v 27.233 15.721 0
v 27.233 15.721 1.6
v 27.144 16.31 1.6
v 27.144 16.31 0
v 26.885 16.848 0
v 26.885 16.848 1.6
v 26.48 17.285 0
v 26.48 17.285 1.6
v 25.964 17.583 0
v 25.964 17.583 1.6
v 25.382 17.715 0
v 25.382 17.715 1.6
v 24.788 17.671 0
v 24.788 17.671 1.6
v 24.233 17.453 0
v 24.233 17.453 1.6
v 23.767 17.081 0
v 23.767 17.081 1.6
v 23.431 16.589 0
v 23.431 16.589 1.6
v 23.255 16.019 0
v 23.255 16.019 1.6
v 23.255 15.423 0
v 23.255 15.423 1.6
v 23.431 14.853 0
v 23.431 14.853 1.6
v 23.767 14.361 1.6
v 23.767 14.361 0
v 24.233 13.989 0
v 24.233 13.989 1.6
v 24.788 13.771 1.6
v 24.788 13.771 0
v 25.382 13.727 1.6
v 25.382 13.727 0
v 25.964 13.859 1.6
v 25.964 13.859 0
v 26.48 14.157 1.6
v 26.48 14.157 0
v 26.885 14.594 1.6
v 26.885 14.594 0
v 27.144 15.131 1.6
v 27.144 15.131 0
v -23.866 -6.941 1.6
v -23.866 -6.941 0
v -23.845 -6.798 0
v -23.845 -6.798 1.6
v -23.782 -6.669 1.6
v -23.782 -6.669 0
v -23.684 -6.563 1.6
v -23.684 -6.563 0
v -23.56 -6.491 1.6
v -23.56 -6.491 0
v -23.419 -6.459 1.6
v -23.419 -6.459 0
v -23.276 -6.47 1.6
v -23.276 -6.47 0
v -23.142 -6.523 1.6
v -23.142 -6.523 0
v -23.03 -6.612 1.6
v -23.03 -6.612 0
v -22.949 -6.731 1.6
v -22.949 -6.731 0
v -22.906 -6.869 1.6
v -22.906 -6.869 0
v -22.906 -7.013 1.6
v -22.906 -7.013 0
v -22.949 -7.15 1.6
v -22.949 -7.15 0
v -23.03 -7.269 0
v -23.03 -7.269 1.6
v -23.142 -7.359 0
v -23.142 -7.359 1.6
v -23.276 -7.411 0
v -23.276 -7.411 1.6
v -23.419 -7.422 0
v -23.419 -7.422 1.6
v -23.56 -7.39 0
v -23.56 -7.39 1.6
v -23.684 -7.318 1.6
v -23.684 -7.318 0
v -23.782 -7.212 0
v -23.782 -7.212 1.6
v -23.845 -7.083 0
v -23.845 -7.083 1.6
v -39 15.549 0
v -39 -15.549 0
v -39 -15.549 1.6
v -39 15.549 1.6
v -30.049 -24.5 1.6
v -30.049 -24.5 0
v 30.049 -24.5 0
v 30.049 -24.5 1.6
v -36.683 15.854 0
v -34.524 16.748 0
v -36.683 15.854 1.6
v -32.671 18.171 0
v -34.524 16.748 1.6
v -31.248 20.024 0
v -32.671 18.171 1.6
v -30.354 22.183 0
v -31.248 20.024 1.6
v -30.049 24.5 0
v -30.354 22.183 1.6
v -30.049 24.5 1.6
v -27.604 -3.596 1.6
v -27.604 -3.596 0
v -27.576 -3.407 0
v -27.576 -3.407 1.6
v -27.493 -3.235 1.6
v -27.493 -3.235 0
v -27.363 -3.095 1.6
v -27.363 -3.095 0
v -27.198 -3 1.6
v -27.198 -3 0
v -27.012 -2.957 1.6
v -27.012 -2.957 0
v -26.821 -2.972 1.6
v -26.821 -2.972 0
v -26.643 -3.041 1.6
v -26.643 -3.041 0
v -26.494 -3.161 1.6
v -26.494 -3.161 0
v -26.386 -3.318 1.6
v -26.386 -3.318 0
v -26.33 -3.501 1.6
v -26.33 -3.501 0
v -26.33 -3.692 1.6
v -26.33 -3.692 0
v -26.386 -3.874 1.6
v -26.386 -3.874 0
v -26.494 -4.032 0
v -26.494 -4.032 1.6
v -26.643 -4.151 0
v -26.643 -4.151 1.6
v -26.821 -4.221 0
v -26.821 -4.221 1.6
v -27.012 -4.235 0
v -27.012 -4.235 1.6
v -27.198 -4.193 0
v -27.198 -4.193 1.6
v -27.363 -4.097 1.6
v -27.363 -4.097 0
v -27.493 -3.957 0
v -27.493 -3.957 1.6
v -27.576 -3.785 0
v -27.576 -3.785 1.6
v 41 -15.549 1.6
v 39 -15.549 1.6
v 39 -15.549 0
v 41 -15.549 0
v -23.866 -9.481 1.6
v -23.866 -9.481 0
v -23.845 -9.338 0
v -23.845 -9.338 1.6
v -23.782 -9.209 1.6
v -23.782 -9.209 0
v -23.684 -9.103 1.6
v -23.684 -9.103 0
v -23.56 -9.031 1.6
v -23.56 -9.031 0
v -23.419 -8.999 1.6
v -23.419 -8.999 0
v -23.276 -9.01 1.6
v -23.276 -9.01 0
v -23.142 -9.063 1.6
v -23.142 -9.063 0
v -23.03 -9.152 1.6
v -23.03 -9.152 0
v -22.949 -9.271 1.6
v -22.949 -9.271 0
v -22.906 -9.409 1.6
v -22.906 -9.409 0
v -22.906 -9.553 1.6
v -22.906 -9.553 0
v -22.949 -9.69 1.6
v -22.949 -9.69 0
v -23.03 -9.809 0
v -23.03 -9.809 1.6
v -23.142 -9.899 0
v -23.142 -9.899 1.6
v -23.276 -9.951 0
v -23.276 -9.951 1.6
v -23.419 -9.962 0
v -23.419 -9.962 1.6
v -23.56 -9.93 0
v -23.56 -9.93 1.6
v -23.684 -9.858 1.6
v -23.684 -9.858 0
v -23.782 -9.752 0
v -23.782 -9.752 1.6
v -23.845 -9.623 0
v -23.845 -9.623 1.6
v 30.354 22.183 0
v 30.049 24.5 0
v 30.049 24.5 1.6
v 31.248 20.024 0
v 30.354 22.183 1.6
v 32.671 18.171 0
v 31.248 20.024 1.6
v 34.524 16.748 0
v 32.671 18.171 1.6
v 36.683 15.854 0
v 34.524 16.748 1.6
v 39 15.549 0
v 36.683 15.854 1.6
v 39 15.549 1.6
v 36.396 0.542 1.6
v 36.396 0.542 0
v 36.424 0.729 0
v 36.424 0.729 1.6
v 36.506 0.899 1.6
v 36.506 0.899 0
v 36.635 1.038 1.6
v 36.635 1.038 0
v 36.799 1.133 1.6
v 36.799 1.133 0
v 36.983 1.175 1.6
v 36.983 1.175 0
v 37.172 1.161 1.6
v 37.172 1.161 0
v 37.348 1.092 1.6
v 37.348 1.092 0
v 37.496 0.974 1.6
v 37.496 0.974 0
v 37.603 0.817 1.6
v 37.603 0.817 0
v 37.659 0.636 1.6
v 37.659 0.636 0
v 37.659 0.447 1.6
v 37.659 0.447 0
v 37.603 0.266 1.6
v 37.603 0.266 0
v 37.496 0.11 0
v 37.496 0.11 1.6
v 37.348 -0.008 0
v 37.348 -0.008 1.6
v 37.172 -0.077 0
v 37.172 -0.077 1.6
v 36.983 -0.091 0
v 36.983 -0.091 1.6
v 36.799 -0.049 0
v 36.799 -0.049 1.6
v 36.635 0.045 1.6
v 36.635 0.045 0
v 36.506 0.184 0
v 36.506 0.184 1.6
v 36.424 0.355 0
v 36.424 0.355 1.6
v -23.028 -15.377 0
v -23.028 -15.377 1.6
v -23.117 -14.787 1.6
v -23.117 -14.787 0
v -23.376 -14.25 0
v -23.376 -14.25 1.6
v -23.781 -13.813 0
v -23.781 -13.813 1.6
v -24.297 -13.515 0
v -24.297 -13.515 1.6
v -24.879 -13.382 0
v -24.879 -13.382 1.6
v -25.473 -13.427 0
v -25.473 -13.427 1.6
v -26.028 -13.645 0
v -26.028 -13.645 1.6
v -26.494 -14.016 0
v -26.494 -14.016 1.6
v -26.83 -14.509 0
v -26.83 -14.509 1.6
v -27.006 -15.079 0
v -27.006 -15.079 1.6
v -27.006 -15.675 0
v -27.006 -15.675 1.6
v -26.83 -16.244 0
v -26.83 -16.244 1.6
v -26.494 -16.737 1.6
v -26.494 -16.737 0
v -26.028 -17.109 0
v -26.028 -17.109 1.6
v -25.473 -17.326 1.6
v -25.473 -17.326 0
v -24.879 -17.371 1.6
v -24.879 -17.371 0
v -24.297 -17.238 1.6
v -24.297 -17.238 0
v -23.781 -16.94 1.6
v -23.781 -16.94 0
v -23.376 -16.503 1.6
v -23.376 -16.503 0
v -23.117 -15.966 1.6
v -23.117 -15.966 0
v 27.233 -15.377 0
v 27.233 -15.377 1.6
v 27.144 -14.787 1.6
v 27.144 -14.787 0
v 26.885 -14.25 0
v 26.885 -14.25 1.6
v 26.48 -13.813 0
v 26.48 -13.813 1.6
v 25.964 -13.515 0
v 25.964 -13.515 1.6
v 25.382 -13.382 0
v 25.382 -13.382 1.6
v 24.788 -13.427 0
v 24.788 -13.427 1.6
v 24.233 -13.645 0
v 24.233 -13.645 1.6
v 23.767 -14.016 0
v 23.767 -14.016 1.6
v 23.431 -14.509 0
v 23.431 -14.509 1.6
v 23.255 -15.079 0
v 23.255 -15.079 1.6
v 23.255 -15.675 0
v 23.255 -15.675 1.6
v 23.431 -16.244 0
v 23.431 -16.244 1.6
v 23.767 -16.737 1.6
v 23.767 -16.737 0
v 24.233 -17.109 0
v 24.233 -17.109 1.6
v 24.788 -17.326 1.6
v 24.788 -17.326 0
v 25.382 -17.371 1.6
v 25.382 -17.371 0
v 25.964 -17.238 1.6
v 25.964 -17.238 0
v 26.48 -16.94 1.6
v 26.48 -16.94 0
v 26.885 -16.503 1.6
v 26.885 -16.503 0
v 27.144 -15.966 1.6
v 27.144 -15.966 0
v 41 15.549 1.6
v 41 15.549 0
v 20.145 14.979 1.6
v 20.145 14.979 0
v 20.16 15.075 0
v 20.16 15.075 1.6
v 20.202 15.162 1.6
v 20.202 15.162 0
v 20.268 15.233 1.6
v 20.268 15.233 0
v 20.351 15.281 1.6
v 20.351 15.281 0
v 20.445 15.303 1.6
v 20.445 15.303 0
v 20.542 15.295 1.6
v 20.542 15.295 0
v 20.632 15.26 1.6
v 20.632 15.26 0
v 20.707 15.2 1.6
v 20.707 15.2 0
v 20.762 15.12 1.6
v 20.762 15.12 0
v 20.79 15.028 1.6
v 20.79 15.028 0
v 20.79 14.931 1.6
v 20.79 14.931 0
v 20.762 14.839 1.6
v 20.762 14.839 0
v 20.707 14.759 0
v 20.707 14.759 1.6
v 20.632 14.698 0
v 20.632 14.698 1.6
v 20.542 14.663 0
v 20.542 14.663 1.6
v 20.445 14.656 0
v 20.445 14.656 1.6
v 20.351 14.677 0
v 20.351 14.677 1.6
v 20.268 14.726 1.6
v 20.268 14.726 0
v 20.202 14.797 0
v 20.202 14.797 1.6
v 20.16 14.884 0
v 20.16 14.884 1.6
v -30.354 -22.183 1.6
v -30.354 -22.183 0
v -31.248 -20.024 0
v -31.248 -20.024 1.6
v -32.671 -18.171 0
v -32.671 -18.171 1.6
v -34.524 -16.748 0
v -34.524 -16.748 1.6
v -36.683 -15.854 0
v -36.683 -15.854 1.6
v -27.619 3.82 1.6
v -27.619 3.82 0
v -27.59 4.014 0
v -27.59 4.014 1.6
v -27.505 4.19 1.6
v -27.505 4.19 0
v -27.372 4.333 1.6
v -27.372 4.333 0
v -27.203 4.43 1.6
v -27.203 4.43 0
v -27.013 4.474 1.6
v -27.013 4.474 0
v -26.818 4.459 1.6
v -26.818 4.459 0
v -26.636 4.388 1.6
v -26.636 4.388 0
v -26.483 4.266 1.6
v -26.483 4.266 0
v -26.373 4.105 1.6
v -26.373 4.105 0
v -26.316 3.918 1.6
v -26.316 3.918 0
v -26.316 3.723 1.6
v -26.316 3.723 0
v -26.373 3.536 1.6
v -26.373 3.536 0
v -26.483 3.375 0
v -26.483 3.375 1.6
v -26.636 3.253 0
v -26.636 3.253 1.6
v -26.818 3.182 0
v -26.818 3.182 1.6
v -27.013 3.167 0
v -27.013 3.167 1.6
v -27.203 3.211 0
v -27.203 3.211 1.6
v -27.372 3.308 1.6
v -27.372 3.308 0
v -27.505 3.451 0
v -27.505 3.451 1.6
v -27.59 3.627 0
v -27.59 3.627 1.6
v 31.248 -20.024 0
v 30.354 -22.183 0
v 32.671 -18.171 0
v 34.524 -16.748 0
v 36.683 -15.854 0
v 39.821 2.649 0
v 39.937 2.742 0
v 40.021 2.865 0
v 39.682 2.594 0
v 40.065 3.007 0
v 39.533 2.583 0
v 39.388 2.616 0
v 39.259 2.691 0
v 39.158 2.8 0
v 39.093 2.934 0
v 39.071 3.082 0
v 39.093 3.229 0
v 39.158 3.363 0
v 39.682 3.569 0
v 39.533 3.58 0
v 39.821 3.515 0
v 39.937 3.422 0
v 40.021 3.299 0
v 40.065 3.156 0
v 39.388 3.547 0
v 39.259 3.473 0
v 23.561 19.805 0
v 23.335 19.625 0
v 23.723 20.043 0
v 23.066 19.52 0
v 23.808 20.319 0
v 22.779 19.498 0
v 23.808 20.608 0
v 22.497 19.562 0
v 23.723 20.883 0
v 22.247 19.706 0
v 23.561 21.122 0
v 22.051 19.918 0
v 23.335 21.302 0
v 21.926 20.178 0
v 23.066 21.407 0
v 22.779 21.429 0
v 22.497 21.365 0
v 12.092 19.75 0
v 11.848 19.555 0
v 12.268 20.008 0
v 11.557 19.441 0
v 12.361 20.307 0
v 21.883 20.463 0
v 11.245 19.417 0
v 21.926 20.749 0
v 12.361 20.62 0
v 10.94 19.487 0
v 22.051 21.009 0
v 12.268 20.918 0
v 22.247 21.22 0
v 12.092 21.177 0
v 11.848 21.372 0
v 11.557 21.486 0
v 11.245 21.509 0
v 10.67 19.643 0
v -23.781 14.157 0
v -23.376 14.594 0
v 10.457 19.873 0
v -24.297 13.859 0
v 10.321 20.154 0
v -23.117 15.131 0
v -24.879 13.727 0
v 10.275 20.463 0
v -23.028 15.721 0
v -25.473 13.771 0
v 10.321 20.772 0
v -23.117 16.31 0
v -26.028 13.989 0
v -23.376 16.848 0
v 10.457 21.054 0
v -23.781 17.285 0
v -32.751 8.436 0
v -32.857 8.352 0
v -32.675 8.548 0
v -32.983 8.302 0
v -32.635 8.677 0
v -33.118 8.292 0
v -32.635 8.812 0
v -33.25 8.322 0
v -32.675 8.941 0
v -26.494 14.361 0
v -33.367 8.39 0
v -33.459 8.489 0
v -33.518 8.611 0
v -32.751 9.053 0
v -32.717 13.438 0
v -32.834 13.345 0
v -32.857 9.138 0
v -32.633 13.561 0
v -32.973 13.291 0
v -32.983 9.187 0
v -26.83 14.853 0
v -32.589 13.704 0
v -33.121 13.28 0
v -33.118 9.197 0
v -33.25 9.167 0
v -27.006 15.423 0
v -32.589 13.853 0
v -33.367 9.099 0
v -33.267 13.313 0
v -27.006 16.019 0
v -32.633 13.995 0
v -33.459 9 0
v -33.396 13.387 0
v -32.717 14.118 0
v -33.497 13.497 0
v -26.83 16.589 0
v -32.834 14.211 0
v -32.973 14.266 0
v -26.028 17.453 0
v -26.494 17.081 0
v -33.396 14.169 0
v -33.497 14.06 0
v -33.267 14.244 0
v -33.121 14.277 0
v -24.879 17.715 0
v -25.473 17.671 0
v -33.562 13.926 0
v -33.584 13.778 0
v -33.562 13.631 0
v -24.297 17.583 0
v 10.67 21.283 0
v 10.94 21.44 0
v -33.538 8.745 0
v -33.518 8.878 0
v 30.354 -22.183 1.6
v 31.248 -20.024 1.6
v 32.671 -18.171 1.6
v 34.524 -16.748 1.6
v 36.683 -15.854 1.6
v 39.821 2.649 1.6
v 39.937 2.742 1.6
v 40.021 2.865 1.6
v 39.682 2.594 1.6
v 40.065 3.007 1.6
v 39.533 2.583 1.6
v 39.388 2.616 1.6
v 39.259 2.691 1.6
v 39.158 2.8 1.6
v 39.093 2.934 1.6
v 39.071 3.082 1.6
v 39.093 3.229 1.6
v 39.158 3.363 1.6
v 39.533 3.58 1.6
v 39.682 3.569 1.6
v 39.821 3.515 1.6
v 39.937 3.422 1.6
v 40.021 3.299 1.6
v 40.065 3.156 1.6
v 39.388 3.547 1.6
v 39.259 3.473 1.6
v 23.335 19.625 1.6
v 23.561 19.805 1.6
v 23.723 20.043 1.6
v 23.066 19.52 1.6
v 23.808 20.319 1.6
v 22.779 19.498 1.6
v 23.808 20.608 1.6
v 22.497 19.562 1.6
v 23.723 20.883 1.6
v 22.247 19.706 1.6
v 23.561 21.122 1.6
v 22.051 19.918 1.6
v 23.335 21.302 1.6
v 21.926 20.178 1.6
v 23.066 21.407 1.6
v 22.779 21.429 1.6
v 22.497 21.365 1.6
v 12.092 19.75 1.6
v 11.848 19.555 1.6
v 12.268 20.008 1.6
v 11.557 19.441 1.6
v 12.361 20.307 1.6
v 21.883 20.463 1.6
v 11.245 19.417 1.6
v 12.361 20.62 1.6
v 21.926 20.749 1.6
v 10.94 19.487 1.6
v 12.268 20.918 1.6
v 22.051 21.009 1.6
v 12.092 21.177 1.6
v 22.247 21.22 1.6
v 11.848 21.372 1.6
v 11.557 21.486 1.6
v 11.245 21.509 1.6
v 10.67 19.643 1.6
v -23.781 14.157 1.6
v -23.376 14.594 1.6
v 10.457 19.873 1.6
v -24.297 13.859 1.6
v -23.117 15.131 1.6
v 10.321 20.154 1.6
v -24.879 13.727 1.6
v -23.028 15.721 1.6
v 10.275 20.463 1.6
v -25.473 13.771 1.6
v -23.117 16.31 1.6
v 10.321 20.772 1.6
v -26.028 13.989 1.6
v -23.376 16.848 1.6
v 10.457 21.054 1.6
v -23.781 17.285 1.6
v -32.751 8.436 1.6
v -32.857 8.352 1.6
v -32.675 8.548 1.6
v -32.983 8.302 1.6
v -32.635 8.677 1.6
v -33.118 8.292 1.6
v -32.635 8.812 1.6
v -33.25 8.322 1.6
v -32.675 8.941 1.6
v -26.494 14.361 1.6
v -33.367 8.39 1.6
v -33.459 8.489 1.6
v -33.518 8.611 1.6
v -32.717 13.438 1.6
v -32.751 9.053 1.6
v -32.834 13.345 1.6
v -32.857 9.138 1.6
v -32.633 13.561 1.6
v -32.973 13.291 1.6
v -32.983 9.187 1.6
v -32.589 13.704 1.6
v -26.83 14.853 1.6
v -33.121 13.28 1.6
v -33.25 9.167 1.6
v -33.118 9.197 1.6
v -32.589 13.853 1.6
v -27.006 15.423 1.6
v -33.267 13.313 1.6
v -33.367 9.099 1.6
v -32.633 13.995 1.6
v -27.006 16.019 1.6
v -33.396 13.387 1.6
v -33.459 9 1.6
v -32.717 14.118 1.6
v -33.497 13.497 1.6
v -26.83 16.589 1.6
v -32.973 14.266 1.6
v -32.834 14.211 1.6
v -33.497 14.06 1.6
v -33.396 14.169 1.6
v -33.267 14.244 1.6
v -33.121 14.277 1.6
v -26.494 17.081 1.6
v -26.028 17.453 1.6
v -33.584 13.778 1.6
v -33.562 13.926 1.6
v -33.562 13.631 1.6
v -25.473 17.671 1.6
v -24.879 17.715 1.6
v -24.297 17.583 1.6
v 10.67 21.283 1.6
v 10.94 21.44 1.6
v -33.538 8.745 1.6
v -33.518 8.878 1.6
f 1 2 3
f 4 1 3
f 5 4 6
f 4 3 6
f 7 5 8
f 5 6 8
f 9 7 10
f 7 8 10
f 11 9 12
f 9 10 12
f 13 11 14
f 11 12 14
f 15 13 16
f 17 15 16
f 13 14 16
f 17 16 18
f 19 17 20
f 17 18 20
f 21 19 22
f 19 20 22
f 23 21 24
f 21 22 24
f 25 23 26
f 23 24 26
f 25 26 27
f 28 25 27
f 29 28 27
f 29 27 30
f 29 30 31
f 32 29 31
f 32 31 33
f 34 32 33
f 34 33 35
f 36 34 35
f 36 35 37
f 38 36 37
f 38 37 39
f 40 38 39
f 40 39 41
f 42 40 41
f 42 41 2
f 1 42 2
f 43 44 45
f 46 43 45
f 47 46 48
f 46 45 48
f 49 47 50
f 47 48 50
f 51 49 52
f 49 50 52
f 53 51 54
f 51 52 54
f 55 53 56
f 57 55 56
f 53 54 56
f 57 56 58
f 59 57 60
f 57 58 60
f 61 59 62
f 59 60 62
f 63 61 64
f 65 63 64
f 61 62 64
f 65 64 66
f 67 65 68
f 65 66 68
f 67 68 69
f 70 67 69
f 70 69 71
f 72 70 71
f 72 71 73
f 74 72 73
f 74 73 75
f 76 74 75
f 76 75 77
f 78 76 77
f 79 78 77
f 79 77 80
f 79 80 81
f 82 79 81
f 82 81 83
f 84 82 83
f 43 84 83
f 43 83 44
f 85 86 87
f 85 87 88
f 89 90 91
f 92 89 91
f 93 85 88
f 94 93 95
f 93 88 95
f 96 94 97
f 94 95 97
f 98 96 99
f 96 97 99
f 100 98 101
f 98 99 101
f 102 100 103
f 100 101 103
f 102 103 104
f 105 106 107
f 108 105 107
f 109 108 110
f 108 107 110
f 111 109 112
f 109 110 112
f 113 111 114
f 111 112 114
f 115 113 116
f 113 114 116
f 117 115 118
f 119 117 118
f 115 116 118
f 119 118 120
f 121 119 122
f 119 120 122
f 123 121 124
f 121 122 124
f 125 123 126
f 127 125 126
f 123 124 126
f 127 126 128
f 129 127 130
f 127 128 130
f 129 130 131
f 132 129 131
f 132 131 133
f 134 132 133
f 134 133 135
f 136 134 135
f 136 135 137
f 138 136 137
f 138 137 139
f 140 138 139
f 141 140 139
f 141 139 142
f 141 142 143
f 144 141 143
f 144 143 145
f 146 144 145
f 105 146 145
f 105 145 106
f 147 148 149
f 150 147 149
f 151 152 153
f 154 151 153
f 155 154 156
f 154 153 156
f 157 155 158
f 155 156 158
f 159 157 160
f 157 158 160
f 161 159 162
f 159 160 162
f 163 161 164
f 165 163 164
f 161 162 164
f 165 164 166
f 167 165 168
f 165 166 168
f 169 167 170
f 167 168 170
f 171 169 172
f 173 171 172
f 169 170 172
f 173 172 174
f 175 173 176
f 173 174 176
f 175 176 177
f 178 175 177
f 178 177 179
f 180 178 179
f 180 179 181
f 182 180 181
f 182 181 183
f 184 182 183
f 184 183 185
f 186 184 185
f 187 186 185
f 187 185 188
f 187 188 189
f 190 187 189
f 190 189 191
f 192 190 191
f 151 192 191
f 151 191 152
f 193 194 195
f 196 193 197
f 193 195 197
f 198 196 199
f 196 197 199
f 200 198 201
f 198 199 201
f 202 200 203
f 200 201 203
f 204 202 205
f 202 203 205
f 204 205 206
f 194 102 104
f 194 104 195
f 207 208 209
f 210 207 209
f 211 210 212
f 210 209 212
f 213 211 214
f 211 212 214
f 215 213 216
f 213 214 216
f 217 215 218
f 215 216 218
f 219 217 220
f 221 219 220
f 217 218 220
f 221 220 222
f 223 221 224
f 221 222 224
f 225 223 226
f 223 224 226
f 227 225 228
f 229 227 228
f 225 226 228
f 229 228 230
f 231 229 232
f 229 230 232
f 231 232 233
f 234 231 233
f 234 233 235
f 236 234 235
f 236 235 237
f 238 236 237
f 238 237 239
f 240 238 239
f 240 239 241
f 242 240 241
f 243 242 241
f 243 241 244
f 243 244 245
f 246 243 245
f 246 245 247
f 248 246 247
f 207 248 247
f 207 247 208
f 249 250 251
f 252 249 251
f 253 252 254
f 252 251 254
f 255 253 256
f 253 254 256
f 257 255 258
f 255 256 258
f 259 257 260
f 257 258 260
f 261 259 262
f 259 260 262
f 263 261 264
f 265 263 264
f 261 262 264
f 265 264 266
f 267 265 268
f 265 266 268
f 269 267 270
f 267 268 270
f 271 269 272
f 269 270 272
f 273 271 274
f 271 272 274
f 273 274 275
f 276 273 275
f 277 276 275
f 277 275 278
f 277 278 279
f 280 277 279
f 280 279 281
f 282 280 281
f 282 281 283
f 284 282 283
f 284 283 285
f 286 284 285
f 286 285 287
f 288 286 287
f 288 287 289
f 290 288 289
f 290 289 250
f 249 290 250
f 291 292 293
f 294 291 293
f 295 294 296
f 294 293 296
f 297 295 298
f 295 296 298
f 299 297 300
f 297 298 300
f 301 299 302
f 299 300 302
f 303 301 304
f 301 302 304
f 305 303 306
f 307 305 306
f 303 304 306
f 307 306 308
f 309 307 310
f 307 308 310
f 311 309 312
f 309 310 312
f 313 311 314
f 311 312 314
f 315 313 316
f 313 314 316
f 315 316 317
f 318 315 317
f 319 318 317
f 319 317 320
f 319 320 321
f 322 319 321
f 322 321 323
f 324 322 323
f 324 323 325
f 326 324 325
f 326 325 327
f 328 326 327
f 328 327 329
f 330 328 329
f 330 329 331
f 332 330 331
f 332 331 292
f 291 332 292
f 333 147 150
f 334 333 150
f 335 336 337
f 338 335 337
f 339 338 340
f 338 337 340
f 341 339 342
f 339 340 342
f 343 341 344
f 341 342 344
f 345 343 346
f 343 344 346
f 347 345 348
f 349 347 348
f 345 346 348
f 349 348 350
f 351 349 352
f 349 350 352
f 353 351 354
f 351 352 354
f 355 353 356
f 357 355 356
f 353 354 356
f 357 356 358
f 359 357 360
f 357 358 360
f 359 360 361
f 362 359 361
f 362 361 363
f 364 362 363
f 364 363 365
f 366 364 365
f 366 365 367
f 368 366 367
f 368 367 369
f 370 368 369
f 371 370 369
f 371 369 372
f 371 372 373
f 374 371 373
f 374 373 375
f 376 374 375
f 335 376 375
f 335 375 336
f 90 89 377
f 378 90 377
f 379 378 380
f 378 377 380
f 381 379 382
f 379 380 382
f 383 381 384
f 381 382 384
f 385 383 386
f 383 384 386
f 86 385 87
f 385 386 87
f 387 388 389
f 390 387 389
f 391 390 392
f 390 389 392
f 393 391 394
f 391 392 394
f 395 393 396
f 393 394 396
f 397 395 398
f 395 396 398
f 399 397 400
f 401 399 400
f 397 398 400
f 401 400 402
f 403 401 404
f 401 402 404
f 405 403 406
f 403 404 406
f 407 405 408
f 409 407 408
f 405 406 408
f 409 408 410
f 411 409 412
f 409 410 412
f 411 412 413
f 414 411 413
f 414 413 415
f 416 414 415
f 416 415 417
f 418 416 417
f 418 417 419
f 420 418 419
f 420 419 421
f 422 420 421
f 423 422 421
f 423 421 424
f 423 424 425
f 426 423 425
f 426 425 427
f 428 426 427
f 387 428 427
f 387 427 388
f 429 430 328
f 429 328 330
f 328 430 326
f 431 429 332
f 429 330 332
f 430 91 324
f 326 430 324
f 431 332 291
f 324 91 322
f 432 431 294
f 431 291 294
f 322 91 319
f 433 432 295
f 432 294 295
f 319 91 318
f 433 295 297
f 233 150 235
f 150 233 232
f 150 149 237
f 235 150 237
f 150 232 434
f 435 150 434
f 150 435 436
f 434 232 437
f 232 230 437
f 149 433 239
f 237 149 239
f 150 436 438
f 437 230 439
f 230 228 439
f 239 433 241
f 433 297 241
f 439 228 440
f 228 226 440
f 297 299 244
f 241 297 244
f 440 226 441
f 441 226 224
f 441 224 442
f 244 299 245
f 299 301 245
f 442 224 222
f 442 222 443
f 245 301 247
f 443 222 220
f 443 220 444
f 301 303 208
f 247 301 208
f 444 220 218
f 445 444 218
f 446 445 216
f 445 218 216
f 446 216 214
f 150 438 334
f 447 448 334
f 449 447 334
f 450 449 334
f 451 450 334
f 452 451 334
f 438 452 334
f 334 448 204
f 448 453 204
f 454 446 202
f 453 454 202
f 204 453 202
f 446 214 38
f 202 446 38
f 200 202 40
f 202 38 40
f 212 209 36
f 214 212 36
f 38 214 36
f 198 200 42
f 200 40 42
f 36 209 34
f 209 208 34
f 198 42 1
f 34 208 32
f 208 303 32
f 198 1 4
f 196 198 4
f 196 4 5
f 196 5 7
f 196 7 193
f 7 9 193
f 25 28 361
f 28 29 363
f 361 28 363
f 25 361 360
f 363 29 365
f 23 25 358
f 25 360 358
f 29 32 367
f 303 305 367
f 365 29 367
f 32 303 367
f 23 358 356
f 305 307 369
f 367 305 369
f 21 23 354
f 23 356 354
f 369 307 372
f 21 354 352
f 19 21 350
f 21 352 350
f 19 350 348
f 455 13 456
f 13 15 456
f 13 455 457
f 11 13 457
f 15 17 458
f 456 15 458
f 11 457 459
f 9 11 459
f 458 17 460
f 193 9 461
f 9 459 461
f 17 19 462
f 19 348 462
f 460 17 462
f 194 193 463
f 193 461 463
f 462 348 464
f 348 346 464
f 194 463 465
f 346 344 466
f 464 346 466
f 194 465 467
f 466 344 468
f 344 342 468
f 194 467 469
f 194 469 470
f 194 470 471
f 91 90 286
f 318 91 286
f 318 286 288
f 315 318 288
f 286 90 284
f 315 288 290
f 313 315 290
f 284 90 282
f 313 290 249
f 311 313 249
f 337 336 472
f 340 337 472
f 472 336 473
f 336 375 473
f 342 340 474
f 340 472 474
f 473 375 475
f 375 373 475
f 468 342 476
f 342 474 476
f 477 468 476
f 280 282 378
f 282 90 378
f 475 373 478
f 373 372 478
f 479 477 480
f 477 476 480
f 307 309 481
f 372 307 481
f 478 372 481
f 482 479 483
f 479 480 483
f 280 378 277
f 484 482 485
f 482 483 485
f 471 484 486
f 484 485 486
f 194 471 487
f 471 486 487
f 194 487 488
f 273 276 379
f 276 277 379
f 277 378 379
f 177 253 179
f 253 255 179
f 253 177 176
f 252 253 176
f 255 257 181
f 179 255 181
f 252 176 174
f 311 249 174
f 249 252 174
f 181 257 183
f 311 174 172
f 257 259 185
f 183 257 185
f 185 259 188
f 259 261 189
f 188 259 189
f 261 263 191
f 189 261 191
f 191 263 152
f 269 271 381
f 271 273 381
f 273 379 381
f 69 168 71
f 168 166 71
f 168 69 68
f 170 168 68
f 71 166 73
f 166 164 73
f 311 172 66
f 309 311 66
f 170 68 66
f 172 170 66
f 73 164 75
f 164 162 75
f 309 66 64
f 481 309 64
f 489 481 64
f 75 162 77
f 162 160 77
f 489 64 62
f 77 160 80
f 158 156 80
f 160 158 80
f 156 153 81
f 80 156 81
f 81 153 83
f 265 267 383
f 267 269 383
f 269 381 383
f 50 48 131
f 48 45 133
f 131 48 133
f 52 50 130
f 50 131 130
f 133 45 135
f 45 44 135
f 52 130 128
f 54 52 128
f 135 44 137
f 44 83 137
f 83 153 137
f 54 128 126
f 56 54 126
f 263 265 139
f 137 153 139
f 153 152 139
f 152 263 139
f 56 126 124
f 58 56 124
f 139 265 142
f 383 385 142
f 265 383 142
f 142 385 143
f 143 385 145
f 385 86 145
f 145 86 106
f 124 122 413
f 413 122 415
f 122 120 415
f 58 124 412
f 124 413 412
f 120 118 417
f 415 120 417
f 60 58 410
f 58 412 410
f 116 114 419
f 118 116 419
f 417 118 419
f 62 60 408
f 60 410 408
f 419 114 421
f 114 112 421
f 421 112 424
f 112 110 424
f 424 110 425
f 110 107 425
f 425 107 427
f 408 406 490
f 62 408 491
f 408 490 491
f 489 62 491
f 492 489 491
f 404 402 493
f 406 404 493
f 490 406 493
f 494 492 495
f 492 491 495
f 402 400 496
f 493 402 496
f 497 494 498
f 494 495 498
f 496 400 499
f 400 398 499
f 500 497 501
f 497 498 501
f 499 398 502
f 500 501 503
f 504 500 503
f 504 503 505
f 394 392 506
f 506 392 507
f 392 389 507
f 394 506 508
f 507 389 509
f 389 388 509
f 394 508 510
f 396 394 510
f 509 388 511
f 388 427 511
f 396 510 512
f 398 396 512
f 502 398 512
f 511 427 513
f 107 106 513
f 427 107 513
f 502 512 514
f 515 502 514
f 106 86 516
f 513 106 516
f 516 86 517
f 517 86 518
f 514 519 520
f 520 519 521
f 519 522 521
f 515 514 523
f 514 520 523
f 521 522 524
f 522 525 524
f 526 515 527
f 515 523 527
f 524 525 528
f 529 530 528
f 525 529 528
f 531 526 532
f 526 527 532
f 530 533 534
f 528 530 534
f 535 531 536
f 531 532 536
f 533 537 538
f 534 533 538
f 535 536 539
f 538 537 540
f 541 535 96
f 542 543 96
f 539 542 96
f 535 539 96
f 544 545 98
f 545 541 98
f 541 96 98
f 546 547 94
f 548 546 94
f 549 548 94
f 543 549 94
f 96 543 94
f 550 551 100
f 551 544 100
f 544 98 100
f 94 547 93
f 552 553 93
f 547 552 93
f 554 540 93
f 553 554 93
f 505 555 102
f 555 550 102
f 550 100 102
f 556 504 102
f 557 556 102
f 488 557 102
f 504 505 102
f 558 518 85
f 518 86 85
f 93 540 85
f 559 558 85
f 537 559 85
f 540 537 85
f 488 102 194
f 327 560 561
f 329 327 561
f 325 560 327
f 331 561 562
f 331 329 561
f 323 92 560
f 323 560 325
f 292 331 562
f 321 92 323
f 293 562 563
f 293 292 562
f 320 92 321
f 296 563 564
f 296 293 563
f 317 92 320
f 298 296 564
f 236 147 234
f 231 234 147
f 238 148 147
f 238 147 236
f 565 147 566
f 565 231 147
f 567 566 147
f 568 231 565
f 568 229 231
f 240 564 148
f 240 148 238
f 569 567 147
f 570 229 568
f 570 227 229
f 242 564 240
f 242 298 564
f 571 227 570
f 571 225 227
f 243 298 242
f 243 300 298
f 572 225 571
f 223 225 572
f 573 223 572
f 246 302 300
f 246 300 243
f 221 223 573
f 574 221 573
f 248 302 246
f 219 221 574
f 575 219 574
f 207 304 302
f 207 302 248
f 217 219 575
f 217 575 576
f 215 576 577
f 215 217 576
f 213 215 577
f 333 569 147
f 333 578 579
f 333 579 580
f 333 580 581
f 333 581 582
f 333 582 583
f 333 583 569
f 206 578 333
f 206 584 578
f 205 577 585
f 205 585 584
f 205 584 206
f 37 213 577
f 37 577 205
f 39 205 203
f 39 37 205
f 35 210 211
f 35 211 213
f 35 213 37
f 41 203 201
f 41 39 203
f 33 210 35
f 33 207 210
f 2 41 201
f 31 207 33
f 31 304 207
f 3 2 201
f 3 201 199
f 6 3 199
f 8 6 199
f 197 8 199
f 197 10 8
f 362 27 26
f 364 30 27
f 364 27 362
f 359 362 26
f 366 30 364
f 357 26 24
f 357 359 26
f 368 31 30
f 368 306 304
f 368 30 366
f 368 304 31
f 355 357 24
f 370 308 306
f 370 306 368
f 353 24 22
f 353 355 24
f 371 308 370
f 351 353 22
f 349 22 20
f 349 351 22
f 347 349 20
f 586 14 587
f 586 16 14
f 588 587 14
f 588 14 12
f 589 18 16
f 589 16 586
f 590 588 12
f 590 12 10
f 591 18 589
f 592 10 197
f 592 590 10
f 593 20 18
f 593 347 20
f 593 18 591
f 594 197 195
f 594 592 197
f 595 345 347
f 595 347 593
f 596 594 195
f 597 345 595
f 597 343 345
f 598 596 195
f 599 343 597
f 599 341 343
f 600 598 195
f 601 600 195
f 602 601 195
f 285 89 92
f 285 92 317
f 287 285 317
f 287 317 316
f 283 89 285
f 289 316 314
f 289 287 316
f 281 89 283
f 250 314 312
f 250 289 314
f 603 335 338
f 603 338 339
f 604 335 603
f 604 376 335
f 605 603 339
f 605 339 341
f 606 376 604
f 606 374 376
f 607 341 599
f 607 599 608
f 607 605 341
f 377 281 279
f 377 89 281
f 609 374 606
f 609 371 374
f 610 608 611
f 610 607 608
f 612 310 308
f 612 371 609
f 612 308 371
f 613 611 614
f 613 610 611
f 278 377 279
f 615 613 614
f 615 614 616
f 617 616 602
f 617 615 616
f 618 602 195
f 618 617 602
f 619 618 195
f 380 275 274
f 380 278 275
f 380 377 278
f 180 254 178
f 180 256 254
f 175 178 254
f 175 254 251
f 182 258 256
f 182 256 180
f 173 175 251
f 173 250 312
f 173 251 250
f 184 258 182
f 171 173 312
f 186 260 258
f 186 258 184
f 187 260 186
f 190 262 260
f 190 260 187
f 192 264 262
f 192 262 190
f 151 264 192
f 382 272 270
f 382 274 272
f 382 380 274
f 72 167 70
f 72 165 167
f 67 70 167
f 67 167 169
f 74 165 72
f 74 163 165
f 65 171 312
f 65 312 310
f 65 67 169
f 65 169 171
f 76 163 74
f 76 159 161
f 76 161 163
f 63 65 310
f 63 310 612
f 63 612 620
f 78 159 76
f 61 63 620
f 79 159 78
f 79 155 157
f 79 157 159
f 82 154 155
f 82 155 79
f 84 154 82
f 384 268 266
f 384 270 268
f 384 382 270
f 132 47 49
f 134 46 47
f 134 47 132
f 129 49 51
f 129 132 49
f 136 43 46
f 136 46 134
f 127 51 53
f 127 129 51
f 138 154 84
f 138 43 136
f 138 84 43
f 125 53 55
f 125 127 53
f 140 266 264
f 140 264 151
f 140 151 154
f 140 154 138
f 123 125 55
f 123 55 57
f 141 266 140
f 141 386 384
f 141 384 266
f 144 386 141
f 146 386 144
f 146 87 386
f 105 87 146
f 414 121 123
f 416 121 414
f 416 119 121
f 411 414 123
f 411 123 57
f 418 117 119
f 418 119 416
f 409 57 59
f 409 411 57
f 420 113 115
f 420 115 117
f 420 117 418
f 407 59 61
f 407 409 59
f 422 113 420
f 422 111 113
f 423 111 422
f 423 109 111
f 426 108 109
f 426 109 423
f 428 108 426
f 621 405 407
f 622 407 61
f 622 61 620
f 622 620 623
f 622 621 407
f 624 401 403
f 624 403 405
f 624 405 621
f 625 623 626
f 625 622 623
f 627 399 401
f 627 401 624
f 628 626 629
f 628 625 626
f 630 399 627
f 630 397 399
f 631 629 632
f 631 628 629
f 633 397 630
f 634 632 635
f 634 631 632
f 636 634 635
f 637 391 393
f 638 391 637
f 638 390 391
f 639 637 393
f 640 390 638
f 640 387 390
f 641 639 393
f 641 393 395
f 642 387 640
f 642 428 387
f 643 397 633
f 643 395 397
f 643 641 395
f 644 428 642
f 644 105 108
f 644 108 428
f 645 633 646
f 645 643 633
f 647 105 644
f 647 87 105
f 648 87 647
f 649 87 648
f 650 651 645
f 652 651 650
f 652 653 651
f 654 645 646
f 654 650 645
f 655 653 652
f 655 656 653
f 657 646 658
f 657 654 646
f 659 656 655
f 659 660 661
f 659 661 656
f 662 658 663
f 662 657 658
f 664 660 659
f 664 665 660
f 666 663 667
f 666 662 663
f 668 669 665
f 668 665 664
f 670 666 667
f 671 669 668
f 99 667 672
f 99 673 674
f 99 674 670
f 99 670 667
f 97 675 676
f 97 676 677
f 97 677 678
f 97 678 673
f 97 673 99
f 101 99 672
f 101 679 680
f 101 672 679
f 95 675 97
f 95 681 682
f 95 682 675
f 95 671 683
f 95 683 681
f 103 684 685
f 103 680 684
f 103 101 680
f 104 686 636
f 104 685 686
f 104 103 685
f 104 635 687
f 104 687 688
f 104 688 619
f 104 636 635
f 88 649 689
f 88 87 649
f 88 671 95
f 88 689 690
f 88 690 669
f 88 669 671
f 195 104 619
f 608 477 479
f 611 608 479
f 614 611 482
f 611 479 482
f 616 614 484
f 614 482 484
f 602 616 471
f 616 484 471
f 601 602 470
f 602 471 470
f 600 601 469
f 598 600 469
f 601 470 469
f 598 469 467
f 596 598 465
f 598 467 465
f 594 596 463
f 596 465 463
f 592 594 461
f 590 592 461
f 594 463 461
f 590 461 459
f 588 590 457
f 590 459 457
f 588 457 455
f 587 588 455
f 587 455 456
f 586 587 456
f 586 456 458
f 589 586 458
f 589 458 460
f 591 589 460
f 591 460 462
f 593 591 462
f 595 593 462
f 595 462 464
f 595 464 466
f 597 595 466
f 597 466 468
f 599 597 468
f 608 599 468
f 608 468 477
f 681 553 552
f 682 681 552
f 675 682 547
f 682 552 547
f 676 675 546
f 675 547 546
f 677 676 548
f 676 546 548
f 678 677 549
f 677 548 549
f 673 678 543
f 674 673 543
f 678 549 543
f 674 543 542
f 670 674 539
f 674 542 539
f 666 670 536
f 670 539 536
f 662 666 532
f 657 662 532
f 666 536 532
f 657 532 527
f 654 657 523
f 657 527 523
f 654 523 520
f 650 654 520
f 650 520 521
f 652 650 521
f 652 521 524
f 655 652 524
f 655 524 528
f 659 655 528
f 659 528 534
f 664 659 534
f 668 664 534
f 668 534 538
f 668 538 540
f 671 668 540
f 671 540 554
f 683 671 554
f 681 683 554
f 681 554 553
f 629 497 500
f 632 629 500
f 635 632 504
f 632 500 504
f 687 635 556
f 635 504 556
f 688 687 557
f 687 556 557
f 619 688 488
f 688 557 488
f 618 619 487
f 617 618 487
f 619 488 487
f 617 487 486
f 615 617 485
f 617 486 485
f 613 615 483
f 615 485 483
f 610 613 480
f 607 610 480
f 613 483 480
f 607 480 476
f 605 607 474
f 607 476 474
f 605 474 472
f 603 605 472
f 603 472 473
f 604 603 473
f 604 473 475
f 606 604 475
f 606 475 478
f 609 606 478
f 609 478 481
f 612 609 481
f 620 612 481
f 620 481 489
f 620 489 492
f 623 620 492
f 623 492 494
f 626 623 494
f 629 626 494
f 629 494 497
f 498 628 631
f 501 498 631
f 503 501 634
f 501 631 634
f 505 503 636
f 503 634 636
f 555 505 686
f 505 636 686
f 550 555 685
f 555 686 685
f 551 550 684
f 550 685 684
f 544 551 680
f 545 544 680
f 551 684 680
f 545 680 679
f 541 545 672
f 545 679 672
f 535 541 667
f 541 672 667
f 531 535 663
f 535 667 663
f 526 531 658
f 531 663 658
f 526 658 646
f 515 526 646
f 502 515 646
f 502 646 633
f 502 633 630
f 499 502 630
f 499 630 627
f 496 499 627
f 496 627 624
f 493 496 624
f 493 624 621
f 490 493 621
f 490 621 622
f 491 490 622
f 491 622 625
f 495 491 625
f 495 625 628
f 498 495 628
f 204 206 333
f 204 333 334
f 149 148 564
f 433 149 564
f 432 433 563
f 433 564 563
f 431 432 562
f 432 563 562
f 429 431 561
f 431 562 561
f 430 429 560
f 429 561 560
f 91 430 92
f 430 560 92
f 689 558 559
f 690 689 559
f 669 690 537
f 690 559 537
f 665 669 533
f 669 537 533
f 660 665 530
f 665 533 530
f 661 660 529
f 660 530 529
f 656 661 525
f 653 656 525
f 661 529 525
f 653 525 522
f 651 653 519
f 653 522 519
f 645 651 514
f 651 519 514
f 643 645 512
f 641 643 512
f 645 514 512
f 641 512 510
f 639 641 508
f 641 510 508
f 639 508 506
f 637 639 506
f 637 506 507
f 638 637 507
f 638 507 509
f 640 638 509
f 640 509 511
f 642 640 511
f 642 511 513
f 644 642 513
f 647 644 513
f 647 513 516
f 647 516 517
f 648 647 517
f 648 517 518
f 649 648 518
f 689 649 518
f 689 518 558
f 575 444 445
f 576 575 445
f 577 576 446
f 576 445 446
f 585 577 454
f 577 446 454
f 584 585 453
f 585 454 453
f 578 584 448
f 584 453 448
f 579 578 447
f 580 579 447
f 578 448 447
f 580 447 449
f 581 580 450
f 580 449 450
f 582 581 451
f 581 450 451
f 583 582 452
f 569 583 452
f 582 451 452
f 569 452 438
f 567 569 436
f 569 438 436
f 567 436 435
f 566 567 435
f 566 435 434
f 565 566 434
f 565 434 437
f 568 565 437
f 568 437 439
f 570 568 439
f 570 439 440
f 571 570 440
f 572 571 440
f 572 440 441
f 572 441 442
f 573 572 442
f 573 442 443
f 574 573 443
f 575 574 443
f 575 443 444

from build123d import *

# Parameters (mm, degrees)
SKETCH1_W           = 78
SKETCH1_H           = 49
BOSS_EXTRUDE1_DEPTH = 1.6
SKETCH2_R           = 8.951195902
CUT_EXTRUDE1_DEPTH  = 10
SKETCH4_W           = 1.6
SKETCH4_H           = 31.097608196
BOSS_EXTRUDE3_DEPTH = 2
SKETCH5_R           = 0.968115871
SKETCH5_R_2         = 1.048792193
SKETCH5_R_3         = 0.324209478
SKETCH5_R_4         = 0.640689511
SKETCH5_R_5         = 0.655195162
SKETCH5_R_6         = 0.453768234
SKETCH5_R_7         = 0.5
SKETCH5_R_8         = 0.4826
SKETCH5_R_9         = 0.635
CUT_EXTRUDE2_DEPTH  = 10
SKETCH6_R           = 2
CUT_EXTRUDE3_DEPTH  = 10


with BuildPart() as part:
    # Sketch1 → Boss-Extrude1 (new body)
    with BuildSketch(Plane.XY):
        Rectangle(SKETCH1_W, SKETCH1_H)
    extrude(amount=BOSS_EXTRUDE1_DEPTH)

    # Sketch2 → Cut-Extrude1 (cut)
    with BuildSketch(Plane.XY.offset(1.6)):
        with Locations((39, 24.5)):
            Circle(SKETCH2_R)
        with Locations((39, -24.5)):
            Circle(SKETCH2_R)
        with Locations((-39, 24.5)):
            Circle(SKETCH2_R)
        with Locations((-39, -24.5)):
            Circle(SKETCH2_R)
    extrude(amount=-CUT_EXTRUDE1_DEPTH, mode=Mode.SUBTRACT)

    # Sketch4 → Boss-Extrude3 (add)
    with BuildSketch(Plane(origin=(39, 0, 0), x_dir=(0, 0, -1), z_dir=(1, 0, 0))):
        with Locations((-0.8, 0)):
            Rectangle(SKETCH4_W, SKETCH4_H)
    extrude(amount=BOSS_EXTRUDE3_DEPTH)

    # Sketch5 → Cut-Extrude2 (cut)
    with BuildSketch(Plane(origin=(0, 0, 0), x_dir=(-1, 0, 0), z_dir=(0, 0, -1))):
        with Locations((-22.850936129, 20.463344351)):
            Circle(SKETCH5_R)
        with Locations((-11.32352045, 20.463344351)):
            Circle(SKETCH5_R_2)
        with Locations((-20.469685942, 14.979253011)):
            Circle(SKETCH5_R_3)
        with Locations((26.963692039, -3.596337313)):
            Circle(SKETCH5_R_4)
        with Locations((26.963692039, 3.820462687)):
            Circle(SKETCH5_R_5)
        with Locations((33.083891647, 8.744582154)):
            Circle(SKETCH5_R_6)
        with Locations((33.083891647, 13.778350388)):
            Circle(SKETCH5_R_7)
        with Locations((23.383432149, -9.480592582)):
            Circle(SKETCH5_R_8)
        with Locations((23.383432149, -6.940592582)):
            Circle(SKETCH5_R_8)
        with Locations((-39.570851538, 3.081777689)):
            Circle(SKETCH5_R_7)
        with Locations((-37.030851538, 0.541777689)):
            Circle(SKETCH5_R_9)
    extrude(amount=-CUT_EXTRUDE2_DEPTH, mode=Mode.SUBTRACT)

    # Sketch6 → Cut-Extrude3 (cut)
    with BuildSketch(Plane.XY.offset(1.6)):
        with Locations((25.232939878, -15.376639124)):
            Circle(SKETCH6_R)
        with Locations((-25.028046678, -15.376639124)):
            Circle(SKETCH6_R)
        with Locations((-25.028046678, 15.720969071)):
            Circle(SKETCH6_R)
        with Locations((25.232939878, 15.720969071)):
            Circle(SKETCH6_R)
    extrude(amount=-CUT_EXTRUDE3_DEPTH, mode=Mode.SUBTRACT)


solid = part.part
